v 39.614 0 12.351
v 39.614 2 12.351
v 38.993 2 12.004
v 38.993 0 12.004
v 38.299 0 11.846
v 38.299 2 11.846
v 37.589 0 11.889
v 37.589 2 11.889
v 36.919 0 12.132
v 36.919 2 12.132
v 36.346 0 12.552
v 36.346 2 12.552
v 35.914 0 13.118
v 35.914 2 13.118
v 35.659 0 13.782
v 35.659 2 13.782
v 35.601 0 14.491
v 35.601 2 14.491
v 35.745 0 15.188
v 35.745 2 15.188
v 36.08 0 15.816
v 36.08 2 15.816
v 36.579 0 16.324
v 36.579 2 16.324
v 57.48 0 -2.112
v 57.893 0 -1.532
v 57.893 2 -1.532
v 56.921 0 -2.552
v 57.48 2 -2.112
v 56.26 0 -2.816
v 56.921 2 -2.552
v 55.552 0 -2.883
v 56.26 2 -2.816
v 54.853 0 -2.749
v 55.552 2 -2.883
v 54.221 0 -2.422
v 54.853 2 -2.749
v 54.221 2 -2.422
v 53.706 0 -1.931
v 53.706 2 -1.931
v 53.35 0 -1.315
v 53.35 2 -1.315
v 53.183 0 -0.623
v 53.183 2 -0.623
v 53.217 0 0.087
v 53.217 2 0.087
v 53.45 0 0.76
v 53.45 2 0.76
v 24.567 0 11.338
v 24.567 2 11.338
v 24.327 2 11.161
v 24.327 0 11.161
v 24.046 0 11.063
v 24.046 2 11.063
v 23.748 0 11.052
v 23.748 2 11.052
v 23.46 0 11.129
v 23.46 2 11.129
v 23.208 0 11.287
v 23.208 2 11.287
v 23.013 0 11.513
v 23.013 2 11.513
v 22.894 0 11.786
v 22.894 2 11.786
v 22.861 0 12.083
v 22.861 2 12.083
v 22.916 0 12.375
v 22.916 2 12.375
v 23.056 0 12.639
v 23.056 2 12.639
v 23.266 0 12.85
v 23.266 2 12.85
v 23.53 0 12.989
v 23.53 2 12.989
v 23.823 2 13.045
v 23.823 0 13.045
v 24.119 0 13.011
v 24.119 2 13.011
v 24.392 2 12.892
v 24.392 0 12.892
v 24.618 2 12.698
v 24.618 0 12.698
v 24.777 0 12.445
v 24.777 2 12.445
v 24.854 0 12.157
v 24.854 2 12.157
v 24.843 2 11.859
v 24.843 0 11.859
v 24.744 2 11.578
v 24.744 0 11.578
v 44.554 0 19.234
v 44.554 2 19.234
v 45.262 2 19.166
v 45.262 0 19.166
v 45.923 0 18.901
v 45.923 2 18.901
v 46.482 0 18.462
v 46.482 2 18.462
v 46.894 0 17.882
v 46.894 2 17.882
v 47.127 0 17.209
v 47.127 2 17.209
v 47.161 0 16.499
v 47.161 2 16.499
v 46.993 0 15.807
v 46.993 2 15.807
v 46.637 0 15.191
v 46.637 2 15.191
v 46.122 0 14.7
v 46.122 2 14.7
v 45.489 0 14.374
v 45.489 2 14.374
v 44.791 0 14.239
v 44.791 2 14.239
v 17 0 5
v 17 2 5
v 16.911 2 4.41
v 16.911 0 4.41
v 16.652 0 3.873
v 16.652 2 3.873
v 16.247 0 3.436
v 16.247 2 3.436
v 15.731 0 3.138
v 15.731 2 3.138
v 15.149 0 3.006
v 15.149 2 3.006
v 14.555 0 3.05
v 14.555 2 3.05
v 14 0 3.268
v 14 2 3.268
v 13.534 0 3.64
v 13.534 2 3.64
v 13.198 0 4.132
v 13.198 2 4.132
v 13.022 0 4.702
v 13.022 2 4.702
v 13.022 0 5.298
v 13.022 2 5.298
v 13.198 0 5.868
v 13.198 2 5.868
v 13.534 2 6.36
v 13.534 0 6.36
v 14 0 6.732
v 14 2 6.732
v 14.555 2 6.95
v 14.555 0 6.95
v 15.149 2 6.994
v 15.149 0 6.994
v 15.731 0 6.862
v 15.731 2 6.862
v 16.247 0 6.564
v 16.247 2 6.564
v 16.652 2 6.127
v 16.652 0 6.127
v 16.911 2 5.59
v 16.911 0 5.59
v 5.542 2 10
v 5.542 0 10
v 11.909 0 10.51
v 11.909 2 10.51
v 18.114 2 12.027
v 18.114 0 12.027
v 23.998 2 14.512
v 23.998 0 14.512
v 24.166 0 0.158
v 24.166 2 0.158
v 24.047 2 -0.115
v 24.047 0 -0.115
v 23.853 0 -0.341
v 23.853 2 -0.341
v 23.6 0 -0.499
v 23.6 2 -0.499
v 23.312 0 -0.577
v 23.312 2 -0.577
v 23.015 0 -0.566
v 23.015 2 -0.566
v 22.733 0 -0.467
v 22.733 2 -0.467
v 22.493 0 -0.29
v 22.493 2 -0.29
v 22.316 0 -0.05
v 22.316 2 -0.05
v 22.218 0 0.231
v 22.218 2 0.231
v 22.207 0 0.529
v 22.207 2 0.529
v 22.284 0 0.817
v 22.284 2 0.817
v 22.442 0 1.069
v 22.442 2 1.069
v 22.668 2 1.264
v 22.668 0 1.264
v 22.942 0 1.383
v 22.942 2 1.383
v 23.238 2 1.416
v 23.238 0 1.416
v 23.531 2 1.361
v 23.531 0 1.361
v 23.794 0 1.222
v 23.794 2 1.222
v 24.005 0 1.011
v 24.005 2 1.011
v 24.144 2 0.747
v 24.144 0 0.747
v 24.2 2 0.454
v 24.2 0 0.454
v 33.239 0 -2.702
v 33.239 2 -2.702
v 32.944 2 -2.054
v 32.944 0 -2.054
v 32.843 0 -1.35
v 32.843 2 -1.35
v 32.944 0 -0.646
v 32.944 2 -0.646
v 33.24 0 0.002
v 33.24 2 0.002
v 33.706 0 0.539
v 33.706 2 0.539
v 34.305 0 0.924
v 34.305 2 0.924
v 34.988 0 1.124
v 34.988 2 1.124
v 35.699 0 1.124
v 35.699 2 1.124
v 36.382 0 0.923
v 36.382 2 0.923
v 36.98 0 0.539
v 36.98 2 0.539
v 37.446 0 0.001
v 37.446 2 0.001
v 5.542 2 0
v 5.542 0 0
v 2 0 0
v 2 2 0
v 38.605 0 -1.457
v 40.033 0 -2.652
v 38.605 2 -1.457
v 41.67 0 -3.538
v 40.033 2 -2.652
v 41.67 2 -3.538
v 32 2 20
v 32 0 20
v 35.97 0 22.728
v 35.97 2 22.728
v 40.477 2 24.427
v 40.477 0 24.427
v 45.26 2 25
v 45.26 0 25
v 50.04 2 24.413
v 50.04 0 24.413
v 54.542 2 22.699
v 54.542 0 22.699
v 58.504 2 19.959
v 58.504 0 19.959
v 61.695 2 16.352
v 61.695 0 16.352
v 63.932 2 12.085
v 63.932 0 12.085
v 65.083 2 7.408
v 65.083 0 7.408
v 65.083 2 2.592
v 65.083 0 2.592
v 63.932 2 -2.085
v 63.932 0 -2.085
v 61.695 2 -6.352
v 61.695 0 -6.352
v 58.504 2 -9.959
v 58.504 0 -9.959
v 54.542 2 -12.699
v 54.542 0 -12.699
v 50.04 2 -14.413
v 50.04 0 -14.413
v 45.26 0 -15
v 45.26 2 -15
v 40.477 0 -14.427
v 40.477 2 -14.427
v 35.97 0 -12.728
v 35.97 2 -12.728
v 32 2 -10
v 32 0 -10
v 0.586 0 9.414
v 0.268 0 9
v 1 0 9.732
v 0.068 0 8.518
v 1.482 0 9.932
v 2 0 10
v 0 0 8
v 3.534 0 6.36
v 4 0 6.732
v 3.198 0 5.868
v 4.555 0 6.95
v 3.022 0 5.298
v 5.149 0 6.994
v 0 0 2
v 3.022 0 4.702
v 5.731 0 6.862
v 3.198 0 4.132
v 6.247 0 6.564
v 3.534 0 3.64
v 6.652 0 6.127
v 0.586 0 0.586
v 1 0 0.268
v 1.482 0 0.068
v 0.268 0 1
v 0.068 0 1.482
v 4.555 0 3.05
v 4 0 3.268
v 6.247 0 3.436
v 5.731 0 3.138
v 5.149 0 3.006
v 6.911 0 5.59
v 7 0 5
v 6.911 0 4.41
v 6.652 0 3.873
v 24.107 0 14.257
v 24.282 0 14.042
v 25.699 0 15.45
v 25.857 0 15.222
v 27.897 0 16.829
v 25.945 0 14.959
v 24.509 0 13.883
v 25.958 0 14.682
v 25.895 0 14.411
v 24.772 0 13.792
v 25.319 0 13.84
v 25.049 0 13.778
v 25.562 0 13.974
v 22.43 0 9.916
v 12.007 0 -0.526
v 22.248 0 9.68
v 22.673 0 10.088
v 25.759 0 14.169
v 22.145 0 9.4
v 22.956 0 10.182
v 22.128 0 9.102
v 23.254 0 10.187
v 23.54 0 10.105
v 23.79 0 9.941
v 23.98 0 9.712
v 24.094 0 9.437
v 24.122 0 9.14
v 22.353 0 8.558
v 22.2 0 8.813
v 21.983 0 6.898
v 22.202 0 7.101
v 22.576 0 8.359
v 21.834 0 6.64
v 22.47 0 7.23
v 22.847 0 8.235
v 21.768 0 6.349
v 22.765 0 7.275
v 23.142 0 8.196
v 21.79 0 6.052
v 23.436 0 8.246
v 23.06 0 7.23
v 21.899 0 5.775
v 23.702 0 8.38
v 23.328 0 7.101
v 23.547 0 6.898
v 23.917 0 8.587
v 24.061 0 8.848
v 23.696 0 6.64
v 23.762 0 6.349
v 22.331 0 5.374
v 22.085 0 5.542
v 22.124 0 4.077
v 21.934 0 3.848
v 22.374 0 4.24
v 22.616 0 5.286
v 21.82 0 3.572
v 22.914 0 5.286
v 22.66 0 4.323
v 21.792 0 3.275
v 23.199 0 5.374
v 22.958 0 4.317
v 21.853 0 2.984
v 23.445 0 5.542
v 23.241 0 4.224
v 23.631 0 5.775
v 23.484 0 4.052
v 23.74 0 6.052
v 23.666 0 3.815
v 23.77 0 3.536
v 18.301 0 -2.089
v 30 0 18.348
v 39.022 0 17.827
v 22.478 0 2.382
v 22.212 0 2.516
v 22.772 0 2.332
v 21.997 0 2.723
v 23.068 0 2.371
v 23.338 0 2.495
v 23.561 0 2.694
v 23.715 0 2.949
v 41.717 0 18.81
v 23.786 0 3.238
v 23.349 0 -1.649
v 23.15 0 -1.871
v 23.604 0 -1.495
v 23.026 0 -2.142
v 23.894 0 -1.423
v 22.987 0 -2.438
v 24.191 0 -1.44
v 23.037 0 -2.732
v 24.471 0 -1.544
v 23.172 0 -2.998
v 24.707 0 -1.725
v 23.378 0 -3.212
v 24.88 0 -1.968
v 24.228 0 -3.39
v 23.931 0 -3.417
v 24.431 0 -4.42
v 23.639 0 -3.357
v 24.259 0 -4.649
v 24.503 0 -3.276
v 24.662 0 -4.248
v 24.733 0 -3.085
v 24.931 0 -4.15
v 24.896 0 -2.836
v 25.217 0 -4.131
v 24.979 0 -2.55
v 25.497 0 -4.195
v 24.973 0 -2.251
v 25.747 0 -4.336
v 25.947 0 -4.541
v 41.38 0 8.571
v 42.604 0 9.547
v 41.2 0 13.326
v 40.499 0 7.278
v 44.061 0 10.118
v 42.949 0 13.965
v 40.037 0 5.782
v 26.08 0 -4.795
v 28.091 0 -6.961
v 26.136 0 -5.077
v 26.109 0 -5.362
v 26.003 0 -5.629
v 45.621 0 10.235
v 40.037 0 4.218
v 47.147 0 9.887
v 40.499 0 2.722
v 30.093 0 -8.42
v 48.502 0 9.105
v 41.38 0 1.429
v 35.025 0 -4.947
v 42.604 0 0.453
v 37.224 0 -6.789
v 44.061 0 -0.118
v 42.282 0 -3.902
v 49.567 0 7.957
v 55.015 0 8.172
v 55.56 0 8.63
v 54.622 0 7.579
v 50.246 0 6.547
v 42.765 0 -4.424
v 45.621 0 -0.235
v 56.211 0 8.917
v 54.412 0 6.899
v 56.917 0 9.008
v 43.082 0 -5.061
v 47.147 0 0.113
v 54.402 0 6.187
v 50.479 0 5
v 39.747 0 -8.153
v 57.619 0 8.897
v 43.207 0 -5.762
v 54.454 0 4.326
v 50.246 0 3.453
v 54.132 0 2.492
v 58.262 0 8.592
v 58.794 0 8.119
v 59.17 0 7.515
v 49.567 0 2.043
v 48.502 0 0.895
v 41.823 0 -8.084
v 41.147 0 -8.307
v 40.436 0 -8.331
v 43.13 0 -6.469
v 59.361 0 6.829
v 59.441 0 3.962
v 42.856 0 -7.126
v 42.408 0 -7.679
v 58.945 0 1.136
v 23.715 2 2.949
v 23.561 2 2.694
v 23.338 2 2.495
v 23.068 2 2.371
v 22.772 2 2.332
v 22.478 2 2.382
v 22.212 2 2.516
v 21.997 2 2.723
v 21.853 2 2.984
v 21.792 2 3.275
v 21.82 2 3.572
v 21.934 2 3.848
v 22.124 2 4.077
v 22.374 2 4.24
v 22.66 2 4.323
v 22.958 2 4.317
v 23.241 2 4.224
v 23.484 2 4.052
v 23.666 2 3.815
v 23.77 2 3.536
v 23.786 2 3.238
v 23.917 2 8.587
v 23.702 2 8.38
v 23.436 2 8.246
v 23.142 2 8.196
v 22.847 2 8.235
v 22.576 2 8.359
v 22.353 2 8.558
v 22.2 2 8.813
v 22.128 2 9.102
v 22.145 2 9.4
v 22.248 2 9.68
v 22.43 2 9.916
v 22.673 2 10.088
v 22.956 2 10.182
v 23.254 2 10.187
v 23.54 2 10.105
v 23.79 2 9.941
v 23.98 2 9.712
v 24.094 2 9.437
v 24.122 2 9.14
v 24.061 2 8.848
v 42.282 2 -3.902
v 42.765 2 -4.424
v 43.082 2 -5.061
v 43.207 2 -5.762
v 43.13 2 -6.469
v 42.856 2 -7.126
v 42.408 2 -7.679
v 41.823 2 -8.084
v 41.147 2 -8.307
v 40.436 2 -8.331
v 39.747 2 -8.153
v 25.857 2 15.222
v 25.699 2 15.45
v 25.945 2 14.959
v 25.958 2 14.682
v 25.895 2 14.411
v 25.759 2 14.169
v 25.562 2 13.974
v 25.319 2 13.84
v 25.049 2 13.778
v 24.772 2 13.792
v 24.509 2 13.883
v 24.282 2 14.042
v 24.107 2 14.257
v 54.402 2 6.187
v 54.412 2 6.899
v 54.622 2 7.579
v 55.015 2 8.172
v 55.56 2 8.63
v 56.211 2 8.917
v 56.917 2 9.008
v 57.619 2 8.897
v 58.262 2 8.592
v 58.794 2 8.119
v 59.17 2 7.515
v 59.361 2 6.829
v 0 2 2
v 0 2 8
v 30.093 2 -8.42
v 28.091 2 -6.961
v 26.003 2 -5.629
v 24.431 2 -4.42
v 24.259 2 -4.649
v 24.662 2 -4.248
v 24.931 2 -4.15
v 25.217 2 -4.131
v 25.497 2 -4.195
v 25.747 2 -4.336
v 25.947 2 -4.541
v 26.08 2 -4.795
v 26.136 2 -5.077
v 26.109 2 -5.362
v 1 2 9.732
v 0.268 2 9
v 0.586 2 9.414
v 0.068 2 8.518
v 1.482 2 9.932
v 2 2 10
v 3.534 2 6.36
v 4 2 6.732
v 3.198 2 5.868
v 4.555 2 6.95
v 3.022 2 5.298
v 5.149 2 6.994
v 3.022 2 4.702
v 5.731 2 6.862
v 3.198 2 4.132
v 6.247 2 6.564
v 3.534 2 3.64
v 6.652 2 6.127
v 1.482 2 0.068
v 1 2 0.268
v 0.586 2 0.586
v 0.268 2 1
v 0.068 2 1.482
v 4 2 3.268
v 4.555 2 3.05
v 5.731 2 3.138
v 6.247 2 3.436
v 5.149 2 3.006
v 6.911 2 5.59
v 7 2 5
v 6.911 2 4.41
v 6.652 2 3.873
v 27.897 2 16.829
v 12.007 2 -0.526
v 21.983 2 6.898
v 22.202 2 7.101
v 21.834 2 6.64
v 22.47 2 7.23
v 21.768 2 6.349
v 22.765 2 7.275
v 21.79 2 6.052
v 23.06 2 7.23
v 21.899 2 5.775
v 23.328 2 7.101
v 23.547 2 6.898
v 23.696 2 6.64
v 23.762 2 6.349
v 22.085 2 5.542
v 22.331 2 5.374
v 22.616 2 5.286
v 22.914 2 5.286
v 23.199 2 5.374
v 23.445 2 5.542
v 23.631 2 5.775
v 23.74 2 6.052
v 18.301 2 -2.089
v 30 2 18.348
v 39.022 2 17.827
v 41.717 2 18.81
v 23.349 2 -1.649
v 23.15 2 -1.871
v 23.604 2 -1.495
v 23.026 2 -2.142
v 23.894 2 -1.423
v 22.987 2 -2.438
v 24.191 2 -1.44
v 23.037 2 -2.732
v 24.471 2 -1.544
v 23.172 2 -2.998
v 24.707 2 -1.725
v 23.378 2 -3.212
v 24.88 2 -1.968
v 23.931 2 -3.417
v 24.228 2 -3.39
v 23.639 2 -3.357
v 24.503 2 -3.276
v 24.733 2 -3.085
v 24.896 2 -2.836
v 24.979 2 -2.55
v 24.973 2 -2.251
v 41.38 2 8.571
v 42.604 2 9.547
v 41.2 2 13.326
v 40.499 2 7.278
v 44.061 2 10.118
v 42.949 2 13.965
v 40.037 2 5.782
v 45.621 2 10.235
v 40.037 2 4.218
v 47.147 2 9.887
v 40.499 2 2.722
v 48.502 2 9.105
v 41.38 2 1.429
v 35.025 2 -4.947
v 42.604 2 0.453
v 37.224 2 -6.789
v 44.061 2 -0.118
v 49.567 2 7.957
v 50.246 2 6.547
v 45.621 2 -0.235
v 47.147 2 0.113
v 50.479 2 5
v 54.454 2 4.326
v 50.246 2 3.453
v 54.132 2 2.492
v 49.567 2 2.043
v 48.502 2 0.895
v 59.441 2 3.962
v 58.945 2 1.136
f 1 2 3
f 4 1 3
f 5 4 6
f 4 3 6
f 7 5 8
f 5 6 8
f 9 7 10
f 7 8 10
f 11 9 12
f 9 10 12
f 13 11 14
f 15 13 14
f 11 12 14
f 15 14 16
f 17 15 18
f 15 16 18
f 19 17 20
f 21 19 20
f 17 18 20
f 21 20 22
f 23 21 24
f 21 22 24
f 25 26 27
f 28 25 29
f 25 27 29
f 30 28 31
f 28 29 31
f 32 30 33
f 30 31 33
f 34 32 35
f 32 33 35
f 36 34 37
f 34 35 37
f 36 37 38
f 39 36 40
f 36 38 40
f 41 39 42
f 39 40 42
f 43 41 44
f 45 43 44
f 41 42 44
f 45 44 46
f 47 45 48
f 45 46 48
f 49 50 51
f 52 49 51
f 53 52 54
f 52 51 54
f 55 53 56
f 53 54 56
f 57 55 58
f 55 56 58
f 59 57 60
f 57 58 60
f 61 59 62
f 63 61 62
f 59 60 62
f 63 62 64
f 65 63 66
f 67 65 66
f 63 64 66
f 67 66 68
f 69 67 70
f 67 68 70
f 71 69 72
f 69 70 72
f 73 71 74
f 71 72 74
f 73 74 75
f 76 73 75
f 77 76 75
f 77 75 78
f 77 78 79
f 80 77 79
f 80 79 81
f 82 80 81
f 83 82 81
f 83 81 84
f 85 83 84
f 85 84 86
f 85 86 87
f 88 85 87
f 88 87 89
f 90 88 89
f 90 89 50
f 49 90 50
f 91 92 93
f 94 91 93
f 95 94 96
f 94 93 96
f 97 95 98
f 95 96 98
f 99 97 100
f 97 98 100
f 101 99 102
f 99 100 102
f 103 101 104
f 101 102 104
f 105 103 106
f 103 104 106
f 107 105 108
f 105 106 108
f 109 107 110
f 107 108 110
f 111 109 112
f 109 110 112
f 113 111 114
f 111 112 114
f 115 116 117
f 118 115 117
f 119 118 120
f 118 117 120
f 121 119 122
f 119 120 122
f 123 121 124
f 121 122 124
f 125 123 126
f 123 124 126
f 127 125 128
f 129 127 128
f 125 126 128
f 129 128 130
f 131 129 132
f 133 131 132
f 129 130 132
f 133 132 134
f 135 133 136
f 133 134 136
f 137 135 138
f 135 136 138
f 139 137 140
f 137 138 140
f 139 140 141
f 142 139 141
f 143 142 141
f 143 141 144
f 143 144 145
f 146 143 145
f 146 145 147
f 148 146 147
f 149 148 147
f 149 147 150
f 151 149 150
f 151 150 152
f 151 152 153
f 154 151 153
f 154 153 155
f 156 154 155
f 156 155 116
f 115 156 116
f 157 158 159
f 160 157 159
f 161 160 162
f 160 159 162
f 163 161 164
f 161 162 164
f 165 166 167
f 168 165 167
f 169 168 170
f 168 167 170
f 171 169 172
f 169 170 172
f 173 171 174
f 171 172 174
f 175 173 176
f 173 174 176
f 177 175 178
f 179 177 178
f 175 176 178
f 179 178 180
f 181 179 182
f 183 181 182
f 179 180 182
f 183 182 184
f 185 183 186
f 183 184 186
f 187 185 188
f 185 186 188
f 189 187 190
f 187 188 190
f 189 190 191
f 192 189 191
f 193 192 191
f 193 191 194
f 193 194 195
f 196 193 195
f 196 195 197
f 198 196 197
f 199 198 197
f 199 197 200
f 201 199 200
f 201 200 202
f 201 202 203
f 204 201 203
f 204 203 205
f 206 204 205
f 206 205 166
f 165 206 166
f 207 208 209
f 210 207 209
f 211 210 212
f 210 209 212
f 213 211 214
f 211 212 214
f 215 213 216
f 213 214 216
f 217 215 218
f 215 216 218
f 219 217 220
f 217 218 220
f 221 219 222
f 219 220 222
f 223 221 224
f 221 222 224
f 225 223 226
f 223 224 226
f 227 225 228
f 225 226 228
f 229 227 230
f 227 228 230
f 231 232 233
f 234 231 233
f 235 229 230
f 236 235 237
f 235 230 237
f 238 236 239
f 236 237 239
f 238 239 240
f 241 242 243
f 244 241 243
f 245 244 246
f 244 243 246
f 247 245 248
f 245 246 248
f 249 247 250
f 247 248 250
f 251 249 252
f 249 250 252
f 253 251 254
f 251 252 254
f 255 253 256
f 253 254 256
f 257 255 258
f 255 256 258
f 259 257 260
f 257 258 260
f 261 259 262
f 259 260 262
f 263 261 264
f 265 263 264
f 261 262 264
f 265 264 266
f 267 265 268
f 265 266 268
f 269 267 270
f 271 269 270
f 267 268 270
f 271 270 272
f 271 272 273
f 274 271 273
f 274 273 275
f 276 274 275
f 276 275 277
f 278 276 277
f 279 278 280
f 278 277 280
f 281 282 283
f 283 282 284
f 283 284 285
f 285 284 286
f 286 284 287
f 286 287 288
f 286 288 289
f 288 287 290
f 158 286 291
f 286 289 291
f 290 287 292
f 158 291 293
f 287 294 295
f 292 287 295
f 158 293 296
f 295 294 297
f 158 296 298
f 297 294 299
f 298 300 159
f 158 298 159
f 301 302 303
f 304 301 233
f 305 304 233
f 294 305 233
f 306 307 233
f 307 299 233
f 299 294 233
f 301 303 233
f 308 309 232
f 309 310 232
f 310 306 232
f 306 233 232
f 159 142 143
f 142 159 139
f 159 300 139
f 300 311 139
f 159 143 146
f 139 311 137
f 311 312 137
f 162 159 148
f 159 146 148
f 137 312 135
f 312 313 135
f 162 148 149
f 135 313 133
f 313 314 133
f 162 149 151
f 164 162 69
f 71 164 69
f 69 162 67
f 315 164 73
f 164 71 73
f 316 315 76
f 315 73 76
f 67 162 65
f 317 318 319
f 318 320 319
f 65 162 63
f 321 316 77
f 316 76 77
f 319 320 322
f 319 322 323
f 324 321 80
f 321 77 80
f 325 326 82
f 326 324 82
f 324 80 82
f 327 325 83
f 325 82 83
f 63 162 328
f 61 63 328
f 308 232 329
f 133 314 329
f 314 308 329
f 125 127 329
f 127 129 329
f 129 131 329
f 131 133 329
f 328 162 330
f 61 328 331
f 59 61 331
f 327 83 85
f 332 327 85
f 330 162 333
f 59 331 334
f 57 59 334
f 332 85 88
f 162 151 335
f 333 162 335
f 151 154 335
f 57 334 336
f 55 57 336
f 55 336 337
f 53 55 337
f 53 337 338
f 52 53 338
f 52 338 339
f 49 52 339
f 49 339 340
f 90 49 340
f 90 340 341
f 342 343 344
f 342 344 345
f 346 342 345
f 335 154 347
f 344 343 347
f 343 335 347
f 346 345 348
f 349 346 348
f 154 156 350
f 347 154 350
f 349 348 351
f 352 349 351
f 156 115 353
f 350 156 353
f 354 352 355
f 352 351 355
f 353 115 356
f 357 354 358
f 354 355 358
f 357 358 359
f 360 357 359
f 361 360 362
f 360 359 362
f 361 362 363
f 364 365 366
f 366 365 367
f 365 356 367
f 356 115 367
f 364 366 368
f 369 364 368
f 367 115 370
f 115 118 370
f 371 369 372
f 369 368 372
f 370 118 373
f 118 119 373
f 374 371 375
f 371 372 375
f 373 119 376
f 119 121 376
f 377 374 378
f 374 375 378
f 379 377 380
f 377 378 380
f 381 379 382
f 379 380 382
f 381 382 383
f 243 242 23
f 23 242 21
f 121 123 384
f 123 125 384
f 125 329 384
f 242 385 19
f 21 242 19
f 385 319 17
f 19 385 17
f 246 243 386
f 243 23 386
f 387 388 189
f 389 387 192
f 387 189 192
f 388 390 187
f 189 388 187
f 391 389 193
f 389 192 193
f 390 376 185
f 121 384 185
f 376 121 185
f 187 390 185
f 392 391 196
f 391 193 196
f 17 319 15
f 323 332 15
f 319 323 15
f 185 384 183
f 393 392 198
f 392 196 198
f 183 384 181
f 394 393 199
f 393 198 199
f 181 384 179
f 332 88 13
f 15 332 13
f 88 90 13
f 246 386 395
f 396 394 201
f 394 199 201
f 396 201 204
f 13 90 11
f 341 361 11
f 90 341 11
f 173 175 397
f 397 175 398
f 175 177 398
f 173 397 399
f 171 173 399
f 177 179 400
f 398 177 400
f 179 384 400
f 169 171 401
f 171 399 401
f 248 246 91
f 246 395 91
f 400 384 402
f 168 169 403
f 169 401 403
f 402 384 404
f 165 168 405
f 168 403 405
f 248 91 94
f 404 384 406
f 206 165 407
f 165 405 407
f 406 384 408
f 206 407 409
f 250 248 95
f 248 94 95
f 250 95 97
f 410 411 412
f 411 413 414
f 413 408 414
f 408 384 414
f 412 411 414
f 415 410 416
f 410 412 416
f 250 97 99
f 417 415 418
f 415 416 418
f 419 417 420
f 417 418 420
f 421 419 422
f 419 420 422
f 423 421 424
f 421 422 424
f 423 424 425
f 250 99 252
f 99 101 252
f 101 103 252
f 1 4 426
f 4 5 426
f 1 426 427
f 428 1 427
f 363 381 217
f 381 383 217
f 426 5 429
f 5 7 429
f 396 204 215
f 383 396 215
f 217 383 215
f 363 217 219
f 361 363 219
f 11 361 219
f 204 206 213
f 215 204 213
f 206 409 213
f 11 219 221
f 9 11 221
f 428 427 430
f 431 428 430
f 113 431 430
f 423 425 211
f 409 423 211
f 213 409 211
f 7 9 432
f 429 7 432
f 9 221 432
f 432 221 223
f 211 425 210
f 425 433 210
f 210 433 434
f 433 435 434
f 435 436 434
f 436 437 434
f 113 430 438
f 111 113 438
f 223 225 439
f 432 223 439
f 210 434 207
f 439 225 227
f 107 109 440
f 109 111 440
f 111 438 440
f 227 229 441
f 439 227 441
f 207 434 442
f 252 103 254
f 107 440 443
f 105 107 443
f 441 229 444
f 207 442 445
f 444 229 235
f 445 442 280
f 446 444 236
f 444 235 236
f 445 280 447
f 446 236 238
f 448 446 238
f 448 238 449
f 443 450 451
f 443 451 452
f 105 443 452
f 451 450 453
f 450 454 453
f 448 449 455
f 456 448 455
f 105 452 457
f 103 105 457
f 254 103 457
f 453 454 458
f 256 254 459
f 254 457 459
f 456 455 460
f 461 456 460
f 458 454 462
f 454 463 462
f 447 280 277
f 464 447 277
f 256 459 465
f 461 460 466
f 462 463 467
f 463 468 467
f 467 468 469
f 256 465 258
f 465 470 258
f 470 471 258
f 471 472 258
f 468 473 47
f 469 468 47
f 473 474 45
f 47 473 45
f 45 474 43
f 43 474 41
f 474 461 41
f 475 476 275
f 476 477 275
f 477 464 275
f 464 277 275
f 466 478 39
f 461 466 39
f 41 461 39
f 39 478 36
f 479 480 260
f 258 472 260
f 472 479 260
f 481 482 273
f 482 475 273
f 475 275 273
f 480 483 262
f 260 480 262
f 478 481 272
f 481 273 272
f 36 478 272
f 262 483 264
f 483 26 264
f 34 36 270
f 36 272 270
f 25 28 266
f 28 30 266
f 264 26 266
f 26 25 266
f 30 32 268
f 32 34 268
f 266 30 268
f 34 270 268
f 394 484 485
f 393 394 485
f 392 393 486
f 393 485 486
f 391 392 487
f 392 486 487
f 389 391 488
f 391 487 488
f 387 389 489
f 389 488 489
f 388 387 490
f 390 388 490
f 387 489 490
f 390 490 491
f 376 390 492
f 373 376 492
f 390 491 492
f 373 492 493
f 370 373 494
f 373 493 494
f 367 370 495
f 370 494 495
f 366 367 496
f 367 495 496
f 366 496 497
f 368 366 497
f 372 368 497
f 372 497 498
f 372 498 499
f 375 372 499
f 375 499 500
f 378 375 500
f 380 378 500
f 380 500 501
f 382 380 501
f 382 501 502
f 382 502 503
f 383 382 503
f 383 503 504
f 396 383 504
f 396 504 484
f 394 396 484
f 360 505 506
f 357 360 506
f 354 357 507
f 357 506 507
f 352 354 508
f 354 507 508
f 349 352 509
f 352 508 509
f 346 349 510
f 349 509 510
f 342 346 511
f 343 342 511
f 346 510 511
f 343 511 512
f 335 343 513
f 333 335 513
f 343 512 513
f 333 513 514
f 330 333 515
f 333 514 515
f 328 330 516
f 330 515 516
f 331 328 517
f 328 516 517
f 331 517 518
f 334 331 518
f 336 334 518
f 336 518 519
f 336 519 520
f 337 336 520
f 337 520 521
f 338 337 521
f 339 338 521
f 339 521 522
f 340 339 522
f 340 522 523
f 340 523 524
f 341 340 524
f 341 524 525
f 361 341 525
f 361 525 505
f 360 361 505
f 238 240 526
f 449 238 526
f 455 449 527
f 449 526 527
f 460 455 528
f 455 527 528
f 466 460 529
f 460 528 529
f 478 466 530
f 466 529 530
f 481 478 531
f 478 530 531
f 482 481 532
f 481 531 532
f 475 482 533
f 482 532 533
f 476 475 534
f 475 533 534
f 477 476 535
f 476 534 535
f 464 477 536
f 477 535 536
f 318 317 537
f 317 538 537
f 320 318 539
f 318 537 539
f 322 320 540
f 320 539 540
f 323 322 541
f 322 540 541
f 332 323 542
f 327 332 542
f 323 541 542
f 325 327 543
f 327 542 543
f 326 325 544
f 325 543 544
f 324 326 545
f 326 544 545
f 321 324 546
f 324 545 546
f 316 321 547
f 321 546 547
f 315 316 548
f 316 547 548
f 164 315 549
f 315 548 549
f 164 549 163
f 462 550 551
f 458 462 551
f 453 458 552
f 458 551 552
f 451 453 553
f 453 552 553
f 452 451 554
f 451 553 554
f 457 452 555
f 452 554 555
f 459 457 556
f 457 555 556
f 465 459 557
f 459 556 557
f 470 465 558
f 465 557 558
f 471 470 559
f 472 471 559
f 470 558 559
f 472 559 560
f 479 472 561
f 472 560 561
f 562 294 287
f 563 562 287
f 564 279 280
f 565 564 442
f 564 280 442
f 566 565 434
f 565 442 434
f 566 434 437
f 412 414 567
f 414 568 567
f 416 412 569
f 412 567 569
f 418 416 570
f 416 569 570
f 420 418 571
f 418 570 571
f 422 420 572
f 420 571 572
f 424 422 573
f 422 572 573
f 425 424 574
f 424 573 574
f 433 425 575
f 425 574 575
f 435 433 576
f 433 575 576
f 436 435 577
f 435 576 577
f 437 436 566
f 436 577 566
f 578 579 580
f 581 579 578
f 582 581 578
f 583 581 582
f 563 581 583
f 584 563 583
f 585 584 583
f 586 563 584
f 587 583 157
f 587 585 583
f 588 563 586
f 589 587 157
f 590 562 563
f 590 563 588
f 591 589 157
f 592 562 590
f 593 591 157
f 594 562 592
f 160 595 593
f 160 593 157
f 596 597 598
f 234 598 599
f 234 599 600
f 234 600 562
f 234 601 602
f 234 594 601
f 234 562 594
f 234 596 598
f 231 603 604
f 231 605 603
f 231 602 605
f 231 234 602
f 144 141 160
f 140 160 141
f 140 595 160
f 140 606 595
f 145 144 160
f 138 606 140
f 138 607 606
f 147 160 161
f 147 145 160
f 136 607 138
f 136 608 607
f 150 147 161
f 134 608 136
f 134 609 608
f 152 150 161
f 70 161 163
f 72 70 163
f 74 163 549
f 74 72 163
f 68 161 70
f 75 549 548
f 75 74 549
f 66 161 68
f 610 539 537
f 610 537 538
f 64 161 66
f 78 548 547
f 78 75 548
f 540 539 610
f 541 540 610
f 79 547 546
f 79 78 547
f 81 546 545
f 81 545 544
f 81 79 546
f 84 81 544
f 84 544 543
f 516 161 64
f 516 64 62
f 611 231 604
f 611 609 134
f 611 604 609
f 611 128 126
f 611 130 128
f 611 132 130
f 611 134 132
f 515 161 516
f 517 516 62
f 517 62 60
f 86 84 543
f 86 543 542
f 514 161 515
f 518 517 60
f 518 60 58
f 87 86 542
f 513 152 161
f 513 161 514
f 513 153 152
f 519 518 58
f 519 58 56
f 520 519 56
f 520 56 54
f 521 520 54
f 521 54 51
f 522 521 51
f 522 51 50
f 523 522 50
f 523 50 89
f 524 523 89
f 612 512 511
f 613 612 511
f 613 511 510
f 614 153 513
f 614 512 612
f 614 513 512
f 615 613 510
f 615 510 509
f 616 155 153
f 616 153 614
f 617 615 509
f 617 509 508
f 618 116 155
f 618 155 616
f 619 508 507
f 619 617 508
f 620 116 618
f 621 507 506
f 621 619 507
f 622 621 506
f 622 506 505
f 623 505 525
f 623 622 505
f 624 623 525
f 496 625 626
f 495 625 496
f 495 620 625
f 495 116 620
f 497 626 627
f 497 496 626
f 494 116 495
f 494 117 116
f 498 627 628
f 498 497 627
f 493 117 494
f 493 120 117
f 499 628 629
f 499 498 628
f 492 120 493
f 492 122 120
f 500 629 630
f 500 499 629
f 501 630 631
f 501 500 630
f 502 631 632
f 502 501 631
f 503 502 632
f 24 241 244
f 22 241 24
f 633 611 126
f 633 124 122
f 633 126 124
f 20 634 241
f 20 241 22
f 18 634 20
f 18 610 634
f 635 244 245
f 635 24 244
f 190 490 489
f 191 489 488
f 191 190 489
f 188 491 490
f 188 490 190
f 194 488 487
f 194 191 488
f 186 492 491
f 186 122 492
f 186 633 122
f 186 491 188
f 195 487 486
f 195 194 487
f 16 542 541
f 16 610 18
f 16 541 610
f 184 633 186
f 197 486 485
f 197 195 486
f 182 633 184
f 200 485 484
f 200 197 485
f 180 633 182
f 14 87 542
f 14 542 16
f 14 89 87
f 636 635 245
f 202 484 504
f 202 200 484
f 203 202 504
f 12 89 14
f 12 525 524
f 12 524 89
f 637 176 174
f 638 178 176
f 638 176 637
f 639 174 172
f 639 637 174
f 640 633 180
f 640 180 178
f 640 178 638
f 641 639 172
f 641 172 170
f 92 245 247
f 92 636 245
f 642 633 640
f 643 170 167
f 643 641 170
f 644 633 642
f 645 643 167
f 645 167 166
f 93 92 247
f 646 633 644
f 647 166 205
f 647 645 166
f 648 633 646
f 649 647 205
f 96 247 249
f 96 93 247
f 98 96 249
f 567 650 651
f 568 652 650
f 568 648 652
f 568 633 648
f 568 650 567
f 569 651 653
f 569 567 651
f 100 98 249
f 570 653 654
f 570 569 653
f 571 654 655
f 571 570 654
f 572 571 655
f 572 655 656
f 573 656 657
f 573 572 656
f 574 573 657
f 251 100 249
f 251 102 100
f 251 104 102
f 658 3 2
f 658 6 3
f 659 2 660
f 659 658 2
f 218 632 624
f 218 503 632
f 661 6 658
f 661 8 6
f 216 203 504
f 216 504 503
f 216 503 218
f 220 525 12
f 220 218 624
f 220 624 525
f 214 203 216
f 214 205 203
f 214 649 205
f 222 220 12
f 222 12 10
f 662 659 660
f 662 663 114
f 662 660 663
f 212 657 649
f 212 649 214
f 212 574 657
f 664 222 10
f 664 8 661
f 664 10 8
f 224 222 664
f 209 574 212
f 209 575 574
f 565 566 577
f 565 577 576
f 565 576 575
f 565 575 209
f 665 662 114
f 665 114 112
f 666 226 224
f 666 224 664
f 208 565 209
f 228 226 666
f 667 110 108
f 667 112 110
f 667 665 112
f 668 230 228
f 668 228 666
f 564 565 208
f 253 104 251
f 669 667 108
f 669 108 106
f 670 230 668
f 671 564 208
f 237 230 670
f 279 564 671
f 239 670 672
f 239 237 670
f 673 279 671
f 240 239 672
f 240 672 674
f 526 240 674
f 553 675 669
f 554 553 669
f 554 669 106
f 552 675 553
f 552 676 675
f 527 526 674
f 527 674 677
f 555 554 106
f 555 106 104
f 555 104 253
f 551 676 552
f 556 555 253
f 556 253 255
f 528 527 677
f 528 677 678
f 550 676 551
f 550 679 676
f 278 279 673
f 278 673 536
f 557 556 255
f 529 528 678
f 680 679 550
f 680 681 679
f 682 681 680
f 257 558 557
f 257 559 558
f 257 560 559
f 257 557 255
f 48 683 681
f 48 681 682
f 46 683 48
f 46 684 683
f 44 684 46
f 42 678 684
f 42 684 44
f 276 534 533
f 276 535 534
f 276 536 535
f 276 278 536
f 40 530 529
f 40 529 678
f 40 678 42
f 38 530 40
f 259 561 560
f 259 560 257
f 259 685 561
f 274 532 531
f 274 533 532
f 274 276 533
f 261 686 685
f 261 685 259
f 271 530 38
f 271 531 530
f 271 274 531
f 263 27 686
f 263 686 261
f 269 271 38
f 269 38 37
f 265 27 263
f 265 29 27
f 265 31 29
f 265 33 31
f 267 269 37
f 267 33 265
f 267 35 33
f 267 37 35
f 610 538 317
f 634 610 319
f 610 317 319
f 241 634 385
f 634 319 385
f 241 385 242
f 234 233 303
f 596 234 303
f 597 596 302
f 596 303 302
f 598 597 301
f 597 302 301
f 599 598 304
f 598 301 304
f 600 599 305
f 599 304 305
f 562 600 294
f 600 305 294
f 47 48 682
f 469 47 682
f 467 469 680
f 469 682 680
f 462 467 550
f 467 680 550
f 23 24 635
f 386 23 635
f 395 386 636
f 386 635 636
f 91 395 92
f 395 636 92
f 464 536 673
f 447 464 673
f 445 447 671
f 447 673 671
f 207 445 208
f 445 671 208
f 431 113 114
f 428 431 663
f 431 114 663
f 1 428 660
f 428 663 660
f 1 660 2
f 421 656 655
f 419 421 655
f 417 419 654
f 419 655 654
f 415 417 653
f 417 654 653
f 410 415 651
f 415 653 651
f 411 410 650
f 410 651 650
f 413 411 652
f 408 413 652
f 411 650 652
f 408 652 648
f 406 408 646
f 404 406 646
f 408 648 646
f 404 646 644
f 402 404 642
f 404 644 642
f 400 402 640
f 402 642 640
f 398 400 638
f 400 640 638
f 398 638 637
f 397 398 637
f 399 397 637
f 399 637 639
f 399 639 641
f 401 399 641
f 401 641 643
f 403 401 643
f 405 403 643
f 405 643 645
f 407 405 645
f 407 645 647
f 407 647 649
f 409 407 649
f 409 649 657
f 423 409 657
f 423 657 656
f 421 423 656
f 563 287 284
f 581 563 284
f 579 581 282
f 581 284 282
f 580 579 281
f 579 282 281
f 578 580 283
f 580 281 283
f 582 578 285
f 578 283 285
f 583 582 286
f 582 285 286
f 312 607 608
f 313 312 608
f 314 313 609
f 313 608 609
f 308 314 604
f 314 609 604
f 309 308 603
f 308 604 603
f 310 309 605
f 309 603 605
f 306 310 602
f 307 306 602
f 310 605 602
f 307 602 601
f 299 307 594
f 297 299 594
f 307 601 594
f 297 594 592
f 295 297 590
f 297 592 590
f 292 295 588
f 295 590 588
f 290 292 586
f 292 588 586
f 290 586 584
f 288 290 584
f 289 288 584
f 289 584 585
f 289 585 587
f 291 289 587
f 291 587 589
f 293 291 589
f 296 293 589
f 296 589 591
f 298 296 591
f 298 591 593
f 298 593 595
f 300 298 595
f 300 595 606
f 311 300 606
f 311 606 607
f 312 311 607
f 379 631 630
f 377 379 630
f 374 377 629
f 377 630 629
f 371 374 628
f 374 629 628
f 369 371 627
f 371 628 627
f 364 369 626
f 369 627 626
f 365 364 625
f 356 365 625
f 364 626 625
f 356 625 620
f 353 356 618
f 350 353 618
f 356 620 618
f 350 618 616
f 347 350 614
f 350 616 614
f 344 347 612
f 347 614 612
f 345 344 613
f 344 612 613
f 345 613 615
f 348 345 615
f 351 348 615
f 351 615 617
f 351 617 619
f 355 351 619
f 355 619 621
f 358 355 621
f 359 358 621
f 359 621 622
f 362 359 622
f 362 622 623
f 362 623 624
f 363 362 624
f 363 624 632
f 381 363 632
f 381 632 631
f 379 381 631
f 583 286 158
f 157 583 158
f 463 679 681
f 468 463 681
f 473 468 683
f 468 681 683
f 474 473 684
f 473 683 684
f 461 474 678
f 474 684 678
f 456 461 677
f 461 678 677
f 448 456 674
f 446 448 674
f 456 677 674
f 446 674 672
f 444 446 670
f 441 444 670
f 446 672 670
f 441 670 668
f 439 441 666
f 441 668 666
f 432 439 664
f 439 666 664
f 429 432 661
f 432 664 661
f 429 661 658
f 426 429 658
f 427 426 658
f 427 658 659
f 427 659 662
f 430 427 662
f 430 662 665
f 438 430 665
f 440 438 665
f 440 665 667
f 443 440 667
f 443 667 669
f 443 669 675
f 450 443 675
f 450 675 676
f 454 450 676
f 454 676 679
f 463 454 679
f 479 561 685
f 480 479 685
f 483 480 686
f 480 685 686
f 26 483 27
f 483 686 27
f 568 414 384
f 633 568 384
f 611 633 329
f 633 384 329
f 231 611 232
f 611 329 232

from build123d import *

# Parameters (mm, degrees)
EXTRUDE_1_DEPTH          = 2
SKETCH_2_R               = 1
CUT_EXTRUDE_1_DEPTH      = 3
PATTERN_CIRCULAR_1_COUNT = 8
PATTERN_CIRCULAR_1_ANGLE = 52.5
SKETCH_3_R               = 2
CUT_EXTRUDE_2_DEPTH      = 3
PATTERN_LINEAR_1_COUNT   = 2
PATTERN_LINEAR_1_PITCH   = 10
CUT_EXTRUDE_4_DEPTH      = 3
PATTERN_CIRCULAR_3_COUNT = 3
SKETCH_7_R               = 5.25
CUT_EXTRUDE_5_DEPTH      = 3


with BuildPart() as part:
    # Эскиз1 → Бобышка-Вытянуть1 (new body)
    with BuildSketch(Plane(origin=(0, 0, 0), x_dir=(1, 0, 0), z_dir=(0, 1, 0))):
        with BuildLine():
            Line((0, -2), (0, -8))
            ThreePointArc((0, -8), (0.585786438, -9.414213562), (2, -10))
            Line((2, -10), (5.542486889, -10))
            ThreePointArc((5.542486889, -10), (19.684622513, -12.583426132), (32, -20))
            ThreePointArc((32, -20), (65.228756555, -5), (32, 10))
            ThreePointArc((32, 10), (19.684622513, 2.583426132), (5.542486889, 0))
            Line((5.542486889, 0), (2, 0))
            ThreePointArc((2, 0), (0.585786438, -0.585786438), (0, -2))
        make_face()
    extrude(amount=EXTRUDE_1_DEPTH)

    # Эскиз2 → Вырез-Вытянуть1 (cut, through all)
    with BuildSketch(Plane(origin=(0, 2, 0), x_dir=(1, 0, 0), z_dir=(0, 1, 0))):
        with Locations((25.137189268, 5.128125392)):
            Circle(SKETCH_2_R)
    cut_extrude_1 = extrude(amount=-CUT_EXTRUDE_1_DEPTH, mode=Mode.SUBTRACT)

    # Круговой массив1: Вырез-Вытянуть1 ×8 about axis
    pattern_circular_1_axis = Axis((45.228756555, 0, 5), (0, 1, 0))
    for i in range(1, PATTERN_CIRCULAR_1_COUNT):
        add(cut_extrude_1.rotate(pattern_circular_1_axis, i * PATTERN_CIRCULAR_1_ANGLE / (PATTERN_CIRCULAR_1_COUNT - 1)), mode=Mode.SUBTRACT)

    # Эскиз3 → Вырез-Вытянуть2 (cut, through all)
    with BuildSketch(Plane(origin=(0, 2, 0), x_dir=(1, 0, 0), z_dir=(0, 1, 0))):
        with Locations((5, -5)):
            Circle(SKETCH_3_R)
    cut_extrude_2 = extrude(amount=-CUT_EXTRUDE_2_DEPTH, mode=Mode.SUBTRACT)

    # Линейный массив1: Вырез-Вытянуть2 ×2
    with Locations(*[(i * PATTERN_LINEAR_1_PITCH, 0, 0) for i in range(1, PATTERN_LINEAR_1_COUNT)]):
        add(cut_extrude_2, mode=Mode.SUBTRACT)

    # Эскиз6 → Вырез-Вытянуть4 (cut, through all)
    with BuildSketch(Plane(origin=(0, 2, 0), x_dir=(1, 0, 0), z_dir=(0, 1, 0))):
        with BuildLine():
            ThreePointArc((37.446222009, -0.000750623), (39.288664725, 2.090532233), (41.67041088, 3.538062681))
            ThreePointArc((41.67041088, 3.538062681), (43.016297342, 6.807403537), (39.746956487, 8.153289999))
            ThreePointArc((39.746956487, 8.153289999), (36.077763715, 5.923300776), (33.239393437, 2.701580475))
            ThreePointArc((33.239393437, 2.701580475), (33.991642174, -0.75299936), (37.446222009, -0.000750623))
        make_face()
    cut_extrude_4 = extrude(amount=-CUT_EXTRUDE_4_DEPTH, mode=Mode.SUBTRACT)

    # Круговой массив3: Вырез-Вытянуть4 ×3 about axis
    pattern_circular_3_axis = Axis((45.228756555, 0, 5), (0, 1, 0))
    for i in range(1, PATTERN_CIRCULAR_3_COUNT):
        add(cut_extrude_4.rotate(pattern_circular_3_axis, i * 360 / PATTERN_CIRCULAR_3_COUNT), mode=Mode.SUBTRACT)

    # Эскиз7 → Вырез-Вытянуть5 (cut, through all)
    with BuildSketch(Plane(origin=(0, 2, 0), x_dir=(1, 0, 0), z_dir=(0, 1, 0))):
        with Locations((45.228756555, -5)):
            Circle(SKETCH_7_R)
    extrude(amount=-CUT_EXTRUDE_5_DEPTH, mode=Mode.SUBTRACT)


solid = part.part
